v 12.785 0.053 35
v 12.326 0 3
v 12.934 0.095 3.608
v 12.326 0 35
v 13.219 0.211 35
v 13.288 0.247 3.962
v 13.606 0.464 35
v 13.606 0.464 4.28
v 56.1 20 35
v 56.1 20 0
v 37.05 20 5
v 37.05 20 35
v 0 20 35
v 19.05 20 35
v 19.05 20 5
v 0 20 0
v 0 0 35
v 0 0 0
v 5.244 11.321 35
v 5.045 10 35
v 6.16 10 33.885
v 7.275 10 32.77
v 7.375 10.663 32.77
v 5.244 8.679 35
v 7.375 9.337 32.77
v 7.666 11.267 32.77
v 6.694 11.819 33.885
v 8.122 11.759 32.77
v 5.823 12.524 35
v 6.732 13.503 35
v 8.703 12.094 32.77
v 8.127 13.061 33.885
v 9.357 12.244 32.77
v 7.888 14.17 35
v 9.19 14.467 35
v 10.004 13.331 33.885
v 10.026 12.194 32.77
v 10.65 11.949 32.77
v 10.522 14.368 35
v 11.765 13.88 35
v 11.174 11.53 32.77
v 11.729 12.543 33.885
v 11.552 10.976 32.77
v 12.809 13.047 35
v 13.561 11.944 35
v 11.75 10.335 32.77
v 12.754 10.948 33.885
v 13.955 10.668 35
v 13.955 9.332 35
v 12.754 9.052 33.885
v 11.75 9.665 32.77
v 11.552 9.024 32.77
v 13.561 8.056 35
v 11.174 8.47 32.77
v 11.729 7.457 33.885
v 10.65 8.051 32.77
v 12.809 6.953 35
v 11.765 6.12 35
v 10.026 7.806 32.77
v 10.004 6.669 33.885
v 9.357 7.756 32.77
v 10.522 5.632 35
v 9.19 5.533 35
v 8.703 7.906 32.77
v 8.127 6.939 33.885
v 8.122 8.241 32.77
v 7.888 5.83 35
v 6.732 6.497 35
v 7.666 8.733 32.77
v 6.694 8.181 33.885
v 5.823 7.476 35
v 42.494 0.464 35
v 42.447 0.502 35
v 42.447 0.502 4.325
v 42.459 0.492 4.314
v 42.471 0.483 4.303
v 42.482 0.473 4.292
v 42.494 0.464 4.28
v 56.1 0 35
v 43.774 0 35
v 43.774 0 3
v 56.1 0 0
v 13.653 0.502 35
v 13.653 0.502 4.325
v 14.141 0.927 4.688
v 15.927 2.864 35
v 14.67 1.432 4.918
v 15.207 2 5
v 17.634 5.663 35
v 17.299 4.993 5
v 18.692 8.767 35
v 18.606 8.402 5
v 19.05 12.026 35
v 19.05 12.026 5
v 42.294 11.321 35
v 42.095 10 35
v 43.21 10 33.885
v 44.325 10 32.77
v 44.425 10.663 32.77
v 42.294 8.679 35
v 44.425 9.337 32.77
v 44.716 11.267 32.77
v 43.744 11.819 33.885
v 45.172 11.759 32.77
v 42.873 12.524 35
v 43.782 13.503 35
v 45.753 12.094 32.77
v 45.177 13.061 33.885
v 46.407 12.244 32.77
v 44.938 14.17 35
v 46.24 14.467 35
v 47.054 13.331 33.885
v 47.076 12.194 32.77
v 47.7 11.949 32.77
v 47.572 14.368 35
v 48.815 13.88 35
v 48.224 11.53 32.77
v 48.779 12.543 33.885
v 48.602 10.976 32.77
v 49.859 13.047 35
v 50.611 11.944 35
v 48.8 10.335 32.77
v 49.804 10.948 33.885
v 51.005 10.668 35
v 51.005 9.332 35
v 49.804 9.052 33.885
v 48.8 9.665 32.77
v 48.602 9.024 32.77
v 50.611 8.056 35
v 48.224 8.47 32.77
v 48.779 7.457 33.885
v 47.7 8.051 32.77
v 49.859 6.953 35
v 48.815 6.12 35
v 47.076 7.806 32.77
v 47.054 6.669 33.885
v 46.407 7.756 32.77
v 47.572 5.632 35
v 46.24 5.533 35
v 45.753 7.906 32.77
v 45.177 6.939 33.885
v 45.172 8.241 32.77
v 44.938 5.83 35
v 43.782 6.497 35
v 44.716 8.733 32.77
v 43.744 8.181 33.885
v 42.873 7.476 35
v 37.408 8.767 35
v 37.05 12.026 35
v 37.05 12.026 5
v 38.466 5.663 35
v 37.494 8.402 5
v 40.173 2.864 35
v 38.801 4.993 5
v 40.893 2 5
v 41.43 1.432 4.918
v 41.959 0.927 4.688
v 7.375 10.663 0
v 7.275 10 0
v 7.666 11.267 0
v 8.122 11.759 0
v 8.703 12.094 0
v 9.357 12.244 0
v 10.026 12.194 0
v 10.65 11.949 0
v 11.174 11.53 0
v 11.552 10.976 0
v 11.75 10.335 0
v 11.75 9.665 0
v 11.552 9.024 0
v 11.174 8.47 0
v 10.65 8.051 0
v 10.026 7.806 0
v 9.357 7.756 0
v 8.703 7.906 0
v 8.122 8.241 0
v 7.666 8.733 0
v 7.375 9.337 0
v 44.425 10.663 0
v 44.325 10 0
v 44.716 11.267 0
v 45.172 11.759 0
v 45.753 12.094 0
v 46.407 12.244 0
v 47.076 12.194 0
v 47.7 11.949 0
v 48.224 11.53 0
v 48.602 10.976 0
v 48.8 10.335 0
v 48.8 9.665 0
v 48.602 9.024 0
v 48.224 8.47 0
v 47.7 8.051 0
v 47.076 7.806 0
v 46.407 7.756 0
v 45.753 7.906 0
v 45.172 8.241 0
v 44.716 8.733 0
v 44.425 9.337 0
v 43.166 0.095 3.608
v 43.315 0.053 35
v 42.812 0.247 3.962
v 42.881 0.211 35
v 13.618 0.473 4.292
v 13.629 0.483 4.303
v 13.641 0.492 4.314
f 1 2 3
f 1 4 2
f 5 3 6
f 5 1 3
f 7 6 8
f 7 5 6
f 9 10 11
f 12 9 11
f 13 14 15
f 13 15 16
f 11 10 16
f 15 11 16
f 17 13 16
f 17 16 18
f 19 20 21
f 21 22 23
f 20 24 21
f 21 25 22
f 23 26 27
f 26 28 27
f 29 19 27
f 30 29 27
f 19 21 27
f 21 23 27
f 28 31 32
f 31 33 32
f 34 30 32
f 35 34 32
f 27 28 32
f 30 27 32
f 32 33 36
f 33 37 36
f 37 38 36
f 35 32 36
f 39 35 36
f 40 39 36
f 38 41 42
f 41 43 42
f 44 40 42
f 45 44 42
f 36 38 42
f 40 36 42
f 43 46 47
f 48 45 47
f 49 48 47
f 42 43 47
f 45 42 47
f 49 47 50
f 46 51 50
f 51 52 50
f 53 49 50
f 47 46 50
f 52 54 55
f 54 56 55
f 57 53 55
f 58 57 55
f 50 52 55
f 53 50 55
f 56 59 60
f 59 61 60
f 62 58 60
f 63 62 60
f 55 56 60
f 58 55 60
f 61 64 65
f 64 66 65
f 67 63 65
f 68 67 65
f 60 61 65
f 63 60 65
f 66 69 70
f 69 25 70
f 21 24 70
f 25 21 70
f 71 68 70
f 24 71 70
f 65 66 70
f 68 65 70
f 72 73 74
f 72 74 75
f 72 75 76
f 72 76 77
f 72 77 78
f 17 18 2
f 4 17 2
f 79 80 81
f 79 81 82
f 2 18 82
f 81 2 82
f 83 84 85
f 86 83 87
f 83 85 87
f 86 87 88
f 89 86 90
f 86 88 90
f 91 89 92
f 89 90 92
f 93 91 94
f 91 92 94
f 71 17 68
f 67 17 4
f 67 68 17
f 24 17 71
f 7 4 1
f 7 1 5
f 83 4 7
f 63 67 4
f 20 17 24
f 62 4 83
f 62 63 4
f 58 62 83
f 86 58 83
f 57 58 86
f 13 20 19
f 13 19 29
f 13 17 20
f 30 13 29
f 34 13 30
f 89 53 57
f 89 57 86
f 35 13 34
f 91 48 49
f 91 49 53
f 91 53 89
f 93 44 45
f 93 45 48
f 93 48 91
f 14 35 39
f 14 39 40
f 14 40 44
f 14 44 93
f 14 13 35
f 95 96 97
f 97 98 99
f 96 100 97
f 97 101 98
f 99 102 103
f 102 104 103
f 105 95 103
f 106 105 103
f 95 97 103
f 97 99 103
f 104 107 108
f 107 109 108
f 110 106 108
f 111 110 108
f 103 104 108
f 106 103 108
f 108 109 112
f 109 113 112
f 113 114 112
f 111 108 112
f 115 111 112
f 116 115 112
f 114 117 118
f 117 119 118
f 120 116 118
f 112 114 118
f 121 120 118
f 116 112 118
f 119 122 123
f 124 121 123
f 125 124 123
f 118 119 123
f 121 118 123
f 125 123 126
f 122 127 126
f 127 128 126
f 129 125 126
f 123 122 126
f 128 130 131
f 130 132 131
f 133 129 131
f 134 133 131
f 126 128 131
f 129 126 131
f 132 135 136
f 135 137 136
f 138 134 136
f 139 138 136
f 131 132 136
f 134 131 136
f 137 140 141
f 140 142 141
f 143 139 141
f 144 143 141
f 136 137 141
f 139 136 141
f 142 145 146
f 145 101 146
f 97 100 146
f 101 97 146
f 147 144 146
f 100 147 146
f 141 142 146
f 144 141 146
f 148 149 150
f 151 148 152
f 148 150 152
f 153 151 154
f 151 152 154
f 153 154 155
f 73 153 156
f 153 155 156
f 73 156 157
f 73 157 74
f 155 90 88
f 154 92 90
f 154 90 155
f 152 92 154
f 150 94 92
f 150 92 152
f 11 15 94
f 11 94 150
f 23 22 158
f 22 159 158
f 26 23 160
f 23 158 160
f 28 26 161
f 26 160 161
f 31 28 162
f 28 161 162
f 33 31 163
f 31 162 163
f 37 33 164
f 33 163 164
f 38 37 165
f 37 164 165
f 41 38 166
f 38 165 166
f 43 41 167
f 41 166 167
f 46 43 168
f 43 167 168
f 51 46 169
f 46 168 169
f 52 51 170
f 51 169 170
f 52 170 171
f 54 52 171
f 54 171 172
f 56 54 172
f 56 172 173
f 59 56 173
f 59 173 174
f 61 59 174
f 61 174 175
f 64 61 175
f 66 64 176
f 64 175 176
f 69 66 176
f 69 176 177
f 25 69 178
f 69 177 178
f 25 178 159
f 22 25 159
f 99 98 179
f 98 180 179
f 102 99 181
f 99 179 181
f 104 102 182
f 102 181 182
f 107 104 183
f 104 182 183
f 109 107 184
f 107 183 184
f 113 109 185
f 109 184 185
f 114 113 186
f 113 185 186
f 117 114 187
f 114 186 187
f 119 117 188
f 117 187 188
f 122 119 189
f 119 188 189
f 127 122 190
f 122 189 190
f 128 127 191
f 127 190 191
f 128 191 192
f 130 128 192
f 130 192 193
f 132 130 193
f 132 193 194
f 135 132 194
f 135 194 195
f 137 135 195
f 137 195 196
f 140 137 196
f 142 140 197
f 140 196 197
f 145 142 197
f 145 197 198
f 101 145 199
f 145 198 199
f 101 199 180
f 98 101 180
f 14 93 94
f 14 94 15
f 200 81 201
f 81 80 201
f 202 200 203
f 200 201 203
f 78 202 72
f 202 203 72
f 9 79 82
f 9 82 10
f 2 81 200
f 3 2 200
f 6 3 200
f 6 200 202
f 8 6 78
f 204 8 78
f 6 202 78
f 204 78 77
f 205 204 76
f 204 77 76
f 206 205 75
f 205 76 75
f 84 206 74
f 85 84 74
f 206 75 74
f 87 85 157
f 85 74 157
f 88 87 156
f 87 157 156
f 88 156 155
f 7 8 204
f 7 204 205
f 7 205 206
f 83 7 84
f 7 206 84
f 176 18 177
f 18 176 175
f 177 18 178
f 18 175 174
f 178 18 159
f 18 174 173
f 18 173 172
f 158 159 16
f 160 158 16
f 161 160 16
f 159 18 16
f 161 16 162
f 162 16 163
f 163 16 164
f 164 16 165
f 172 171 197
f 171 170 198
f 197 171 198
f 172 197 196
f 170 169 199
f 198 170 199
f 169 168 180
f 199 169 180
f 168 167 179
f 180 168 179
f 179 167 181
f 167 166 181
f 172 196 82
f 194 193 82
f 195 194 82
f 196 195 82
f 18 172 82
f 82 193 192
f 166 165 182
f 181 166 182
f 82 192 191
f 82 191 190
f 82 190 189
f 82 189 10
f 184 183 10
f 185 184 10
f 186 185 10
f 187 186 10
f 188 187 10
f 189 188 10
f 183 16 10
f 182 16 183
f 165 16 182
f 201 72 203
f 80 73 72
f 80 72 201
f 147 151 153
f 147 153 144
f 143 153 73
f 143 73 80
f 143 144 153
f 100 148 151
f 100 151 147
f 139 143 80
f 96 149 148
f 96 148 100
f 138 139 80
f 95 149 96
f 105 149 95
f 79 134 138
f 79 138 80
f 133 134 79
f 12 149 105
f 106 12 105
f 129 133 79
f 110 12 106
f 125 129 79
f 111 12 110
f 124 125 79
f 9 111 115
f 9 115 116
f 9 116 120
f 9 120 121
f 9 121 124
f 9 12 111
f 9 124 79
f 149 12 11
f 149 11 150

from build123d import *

# Parameters (mm, degrees)
SKETCH_1_W                  = 56.1
SKETCH_1_H                  = 20
EXTRUDE_1_DEPTH             = 5
EXTRUDE_2_DEPTH             = 30
HOLE_WIZARD_M41_D           = 4.5
HOLE_WIZARD_M41_CSINK_D     = 8.96
HOLE_WIZARD_M41_CSINK_ANGLE = 90
FILLET_1_R                  = 2


with BuildPart() as part:
    # Эскиз1 → Бобышка-Вытянуть1 (new body)
    with BuildSketch(Plane.XY):
        with Locations((28.05, 10)):
            Rectangle(SKETCH_1_W, SKETCH_1_H)
    extrude(amount=EXTRUDE_1_DEPTH)

    # Эскиз2 → Бобышка-Вытянуть2 (add)
    with BuildSketch(Plane.XY.offset(5)):
        with BuildLine():
            Line((19.05, 12.02562419), (19.05, 20))
            Line((19.05, 20), (0, 20))
            Line((0, 20), (0, 0))
            Line((0, 0), (13.05, 0))
            Line((13.05, 0), (13.652765995, 0.502304996))
            ThreePointArc((13.652765995, 0.502304996), (17.633841318, 5.663293246), (19.05, 12.02562419))
        make_face()
        with BuildLine():
            Line((56.1, 20), (37.05, 20))
            Line((37.05, 20), (37.05, 12.02562419))
            ThreePointArc((37.05, 12.02562419), (38.466158682, 5.663293246), (42.447234005, 0.502304996))
            Line((42.447234005, 0.502304996), (43.05, 0))
            Line((43.05, 0), (56.1, 0))
            Line((56.1, 0), (56.1, 20))
        make_face()
    extrude(amount=EXTRUDE_2_DEPTH)

    # Зенковка для  винта с потайной головкой с внутренним шестигранником M41 (through all)
    with Locations(Plane(origin=(9.525, 10, 35), x_dir=(1, 0, 0), z_dir=(0, 0, 1))):
        with Locations((0, 0), (37.05, 0)):
            CounterSinkHole(HOLE_WIZARD_M41_D / 2, HOLE_WIZARD_M41_CSINK_D / 2, counter_sink_angle=HOLE_WIZARD_M41_CSINK_ANGLE)

    # Скругление1
    fillet_1_edges = [part.edges().sort_by_distance(p)[0] for p in [
        (28.05, 0, 5),
    ]]
    fillet(fillet_1_edges, radius=FILLET_1_R)
    fillet_1_2_edges = [part.edges().sort_by_distance(p)[0] for p in [
        (13.05, 0, 19),
    ]]
    fillet(fillet_1_2_edges, radius=FILLET_1_R)
    fillet_1_3_edges = [part.edges().sort_by_distance(p)[0] for p in [
        (43.05, 0, 19.000000047),
    ]]
    fillet(fillet_1_3_edges, radius=FILLET_1_R)


solid = part.part
